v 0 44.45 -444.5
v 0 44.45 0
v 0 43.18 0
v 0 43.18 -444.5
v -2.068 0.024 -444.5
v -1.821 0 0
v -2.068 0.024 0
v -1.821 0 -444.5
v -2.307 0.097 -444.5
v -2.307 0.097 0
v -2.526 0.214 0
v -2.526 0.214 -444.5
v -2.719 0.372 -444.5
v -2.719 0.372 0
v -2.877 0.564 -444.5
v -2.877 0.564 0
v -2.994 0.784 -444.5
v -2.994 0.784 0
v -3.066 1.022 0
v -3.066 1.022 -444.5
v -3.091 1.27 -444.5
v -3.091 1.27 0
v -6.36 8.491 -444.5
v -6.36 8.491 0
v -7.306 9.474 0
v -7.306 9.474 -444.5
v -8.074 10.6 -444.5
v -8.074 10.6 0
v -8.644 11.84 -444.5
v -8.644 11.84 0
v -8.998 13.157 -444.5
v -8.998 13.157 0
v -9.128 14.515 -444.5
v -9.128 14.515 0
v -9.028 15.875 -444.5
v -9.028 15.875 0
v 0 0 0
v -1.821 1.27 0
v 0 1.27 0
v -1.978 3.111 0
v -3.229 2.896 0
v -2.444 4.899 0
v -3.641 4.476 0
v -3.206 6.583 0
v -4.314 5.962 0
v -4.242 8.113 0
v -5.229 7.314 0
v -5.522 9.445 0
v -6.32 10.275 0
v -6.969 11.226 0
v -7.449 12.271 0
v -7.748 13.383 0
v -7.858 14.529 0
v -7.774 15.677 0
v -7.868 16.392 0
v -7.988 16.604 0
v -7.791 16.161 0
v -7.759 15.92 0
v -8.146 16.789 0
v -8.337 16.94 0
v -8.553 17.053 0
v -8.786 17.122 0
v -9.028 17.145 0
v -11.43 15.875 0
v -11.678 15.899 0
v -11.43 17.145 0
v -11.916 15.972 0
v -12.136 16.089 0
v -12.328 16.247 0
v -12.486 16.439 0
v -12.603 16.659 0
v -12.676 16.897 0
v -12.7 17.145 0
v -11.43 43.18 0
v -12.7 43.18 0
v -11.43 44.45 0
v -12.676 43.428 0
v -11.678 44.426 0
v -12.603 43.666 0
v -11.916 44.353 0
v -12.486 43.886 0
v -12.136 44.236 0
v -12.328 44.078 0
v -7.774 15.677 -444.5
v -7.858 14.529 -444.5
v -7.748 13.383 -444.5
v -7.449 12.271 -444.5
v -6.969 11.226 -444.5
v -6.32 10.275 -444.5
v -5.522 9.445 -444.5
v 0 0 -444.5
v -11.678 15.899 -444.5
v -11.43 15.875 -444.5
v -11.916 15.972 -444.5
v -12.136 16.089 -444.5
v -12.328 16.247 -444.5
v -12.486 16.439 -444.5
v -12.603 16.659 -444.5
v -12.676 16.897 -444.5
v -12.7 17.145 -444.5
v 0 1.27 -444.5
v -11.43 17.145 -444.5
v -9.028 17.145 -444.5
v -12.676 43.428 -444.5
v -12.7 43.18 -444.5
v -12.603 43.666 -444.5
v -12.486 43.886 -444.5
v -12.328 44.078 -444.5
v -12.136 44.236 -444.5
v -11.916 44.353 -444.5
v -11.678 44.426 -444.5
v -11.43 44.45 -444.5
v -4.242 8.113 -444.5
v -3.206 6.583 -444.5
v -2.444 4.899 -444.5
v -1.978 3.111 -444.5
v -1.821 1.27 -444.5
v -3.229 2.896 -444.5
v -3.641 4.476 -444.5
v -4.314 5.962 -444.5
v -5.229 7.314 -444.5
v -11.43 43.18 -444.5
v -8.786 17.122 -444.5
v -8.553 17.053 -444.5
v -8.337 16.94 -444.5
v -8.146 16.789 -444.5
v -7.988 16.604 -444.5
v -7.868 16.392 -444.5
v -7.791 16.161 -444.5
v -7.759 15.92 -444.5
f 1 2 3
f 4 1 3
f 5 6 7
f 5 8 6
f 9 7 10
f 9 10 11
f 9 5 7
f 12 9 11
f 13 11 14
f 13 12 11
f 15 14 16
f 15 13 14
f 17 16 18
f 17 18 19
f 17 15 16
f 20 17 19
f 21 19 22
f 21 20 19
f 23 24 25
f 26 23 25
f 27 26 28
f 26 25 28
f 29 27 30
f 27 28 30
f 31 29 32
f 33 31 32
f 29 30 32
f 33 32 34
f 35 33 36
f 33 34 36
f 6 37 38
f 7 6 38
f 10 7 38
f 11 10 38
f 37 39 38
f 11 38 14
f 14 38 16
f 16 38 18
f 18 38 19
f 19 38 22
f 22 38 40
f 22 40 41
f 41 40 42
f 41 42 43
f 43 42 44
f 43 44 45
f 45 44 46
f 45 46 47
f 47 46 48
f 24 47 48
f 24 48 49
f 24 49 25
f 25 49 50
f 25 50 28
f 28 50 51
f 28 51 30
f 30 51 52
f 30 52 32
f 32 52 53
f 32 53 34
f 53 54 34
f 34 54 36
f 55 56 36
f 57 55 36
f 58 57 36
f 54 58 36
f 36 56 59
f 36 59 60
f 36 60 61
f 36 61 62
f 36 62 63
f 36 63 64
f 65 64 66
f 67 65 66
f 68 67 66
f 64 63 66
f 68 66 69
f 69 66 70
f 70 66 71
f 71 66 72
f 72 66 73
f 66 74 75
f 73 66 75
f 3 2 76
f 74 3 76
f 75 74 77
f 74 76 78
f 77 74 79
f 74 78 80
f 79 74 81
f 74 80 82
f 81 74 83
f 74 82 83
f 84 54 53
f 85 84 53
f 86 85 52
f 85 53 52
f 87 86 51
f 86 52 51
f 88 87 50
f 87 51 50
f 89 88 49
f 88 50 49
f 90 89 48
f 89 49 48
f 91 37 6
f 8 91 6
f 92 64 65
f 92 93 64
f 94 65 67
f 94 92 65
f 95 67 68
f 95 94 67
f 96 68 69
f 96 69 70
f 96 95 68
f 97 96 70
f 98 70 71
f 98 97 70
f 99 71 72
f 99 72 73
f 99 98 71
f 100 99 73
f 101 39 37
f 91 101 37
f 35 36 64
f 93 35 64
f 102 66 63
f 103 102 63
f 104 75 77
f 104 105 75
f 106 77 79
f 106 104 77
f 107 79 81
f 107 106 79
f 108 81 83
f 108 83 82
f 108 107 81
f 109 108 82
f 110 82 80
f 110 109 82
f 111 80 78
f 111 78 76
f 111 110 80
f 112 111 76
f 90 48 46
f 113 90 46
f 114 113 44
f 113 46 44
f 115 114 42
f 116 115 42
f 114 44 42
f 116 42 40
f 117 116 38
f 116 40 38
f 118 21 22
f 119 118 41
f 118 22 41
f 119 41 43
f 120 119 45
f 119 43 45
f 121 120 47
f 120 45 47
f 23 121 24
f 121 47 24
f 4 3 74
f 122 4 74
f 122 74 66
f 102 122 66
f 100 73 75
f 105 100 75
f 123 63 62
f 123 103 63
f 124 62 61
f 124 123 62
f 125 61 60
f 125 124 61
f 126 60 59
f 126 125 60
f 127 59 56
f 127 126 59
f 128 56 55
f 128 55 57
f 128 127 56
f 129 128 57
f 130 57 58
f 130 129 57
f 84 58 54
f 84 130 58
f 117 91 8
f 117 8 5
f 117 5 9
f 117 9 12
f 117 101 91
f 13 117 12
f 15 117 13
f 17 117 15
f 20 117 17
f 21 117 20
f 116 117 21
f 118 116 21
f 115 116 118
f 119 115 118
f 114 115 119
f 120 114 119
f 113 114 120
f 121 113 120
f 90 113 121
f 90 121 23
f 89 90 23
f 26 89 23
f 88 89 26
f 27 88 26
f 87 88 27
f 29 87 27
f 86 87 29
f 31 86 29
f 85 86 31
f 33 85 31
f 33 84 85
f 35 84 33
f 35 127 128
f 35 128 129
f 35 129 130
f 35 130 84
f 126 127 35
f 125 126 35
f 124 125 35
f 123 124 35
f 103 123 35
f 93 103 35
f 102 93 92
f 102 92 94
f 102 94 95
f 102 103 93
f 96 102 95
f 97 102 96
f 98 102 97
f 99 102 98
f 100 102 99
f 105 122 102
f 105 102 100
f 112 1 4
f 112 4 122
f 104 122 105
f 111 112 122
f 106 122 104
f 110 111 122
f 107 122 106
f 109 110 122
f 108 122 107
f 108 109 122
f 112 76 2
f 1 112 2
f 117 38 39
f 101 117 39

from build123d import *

# Parameters (mm, degrees)
EXTRUDE_THIN1_DEPTH = 444.5
FILLET1_R           = 1.27


with BuildPart() as part:
    # Sketch1 → Extrude-Thin1 (new body)
    with BuildSketch(Plane.XY):
        with BuildLine():
            Line((0, 0), (-3.175, 0))
            ThreePointArc((-3.175, 0), (-3.702847988, 4.644874913), (-6.360025415, 8.491028131))
            ThreePointArc((-6.360025415, 8.491028131), (-8.643825609, 11.839848435), (-9.028393687, 15.875))
            Line((-9.028393687, 15.875), (-12.7, 15.875))
            Line((-12.7, 15.875), (-12.7, 44.45))
            Line((-12.7, 44.45), (0, 44.45))
            Line((0, 44.45), (0, 43.18))
            Line((0, 43.18), (-11.43, 43.18))
            Line((-11.43, 43.18), (-11.43, 17.145))
            Line((-11.43, 17.145), (-7.371031325, 17.145))
            ThreePointArc((-7.371031325, 17.145), (-7.668334251, 13.001809097), (-5.522110789, 9.445386071))
            ThreePointArc((-5.522110789, 9.445386071), (-2.789162607, 5.757129719), (-1.820706321, 1.27))
            Line((-1.820706321, 1.27), (0, 1.27))
            Line((0, 1.27), (0, 0))
        make_face()
    extrude(amount=-EXTRUDE_THIN1_DEPTH)

    # Fillet1
    fillet1_edges = [part.edges().sort_by_distance(p)[0] for p in [
        (-7.371031325, 17.145, -222.25),
        (-3.175, 0, -222.25),
        (-12.7, 15.875, -222.25),
        (-12.7, 44.45, -222.25),
    ]]
    fillet(fillet1_edges, radius=FILLET1_R)


solid = part.part
